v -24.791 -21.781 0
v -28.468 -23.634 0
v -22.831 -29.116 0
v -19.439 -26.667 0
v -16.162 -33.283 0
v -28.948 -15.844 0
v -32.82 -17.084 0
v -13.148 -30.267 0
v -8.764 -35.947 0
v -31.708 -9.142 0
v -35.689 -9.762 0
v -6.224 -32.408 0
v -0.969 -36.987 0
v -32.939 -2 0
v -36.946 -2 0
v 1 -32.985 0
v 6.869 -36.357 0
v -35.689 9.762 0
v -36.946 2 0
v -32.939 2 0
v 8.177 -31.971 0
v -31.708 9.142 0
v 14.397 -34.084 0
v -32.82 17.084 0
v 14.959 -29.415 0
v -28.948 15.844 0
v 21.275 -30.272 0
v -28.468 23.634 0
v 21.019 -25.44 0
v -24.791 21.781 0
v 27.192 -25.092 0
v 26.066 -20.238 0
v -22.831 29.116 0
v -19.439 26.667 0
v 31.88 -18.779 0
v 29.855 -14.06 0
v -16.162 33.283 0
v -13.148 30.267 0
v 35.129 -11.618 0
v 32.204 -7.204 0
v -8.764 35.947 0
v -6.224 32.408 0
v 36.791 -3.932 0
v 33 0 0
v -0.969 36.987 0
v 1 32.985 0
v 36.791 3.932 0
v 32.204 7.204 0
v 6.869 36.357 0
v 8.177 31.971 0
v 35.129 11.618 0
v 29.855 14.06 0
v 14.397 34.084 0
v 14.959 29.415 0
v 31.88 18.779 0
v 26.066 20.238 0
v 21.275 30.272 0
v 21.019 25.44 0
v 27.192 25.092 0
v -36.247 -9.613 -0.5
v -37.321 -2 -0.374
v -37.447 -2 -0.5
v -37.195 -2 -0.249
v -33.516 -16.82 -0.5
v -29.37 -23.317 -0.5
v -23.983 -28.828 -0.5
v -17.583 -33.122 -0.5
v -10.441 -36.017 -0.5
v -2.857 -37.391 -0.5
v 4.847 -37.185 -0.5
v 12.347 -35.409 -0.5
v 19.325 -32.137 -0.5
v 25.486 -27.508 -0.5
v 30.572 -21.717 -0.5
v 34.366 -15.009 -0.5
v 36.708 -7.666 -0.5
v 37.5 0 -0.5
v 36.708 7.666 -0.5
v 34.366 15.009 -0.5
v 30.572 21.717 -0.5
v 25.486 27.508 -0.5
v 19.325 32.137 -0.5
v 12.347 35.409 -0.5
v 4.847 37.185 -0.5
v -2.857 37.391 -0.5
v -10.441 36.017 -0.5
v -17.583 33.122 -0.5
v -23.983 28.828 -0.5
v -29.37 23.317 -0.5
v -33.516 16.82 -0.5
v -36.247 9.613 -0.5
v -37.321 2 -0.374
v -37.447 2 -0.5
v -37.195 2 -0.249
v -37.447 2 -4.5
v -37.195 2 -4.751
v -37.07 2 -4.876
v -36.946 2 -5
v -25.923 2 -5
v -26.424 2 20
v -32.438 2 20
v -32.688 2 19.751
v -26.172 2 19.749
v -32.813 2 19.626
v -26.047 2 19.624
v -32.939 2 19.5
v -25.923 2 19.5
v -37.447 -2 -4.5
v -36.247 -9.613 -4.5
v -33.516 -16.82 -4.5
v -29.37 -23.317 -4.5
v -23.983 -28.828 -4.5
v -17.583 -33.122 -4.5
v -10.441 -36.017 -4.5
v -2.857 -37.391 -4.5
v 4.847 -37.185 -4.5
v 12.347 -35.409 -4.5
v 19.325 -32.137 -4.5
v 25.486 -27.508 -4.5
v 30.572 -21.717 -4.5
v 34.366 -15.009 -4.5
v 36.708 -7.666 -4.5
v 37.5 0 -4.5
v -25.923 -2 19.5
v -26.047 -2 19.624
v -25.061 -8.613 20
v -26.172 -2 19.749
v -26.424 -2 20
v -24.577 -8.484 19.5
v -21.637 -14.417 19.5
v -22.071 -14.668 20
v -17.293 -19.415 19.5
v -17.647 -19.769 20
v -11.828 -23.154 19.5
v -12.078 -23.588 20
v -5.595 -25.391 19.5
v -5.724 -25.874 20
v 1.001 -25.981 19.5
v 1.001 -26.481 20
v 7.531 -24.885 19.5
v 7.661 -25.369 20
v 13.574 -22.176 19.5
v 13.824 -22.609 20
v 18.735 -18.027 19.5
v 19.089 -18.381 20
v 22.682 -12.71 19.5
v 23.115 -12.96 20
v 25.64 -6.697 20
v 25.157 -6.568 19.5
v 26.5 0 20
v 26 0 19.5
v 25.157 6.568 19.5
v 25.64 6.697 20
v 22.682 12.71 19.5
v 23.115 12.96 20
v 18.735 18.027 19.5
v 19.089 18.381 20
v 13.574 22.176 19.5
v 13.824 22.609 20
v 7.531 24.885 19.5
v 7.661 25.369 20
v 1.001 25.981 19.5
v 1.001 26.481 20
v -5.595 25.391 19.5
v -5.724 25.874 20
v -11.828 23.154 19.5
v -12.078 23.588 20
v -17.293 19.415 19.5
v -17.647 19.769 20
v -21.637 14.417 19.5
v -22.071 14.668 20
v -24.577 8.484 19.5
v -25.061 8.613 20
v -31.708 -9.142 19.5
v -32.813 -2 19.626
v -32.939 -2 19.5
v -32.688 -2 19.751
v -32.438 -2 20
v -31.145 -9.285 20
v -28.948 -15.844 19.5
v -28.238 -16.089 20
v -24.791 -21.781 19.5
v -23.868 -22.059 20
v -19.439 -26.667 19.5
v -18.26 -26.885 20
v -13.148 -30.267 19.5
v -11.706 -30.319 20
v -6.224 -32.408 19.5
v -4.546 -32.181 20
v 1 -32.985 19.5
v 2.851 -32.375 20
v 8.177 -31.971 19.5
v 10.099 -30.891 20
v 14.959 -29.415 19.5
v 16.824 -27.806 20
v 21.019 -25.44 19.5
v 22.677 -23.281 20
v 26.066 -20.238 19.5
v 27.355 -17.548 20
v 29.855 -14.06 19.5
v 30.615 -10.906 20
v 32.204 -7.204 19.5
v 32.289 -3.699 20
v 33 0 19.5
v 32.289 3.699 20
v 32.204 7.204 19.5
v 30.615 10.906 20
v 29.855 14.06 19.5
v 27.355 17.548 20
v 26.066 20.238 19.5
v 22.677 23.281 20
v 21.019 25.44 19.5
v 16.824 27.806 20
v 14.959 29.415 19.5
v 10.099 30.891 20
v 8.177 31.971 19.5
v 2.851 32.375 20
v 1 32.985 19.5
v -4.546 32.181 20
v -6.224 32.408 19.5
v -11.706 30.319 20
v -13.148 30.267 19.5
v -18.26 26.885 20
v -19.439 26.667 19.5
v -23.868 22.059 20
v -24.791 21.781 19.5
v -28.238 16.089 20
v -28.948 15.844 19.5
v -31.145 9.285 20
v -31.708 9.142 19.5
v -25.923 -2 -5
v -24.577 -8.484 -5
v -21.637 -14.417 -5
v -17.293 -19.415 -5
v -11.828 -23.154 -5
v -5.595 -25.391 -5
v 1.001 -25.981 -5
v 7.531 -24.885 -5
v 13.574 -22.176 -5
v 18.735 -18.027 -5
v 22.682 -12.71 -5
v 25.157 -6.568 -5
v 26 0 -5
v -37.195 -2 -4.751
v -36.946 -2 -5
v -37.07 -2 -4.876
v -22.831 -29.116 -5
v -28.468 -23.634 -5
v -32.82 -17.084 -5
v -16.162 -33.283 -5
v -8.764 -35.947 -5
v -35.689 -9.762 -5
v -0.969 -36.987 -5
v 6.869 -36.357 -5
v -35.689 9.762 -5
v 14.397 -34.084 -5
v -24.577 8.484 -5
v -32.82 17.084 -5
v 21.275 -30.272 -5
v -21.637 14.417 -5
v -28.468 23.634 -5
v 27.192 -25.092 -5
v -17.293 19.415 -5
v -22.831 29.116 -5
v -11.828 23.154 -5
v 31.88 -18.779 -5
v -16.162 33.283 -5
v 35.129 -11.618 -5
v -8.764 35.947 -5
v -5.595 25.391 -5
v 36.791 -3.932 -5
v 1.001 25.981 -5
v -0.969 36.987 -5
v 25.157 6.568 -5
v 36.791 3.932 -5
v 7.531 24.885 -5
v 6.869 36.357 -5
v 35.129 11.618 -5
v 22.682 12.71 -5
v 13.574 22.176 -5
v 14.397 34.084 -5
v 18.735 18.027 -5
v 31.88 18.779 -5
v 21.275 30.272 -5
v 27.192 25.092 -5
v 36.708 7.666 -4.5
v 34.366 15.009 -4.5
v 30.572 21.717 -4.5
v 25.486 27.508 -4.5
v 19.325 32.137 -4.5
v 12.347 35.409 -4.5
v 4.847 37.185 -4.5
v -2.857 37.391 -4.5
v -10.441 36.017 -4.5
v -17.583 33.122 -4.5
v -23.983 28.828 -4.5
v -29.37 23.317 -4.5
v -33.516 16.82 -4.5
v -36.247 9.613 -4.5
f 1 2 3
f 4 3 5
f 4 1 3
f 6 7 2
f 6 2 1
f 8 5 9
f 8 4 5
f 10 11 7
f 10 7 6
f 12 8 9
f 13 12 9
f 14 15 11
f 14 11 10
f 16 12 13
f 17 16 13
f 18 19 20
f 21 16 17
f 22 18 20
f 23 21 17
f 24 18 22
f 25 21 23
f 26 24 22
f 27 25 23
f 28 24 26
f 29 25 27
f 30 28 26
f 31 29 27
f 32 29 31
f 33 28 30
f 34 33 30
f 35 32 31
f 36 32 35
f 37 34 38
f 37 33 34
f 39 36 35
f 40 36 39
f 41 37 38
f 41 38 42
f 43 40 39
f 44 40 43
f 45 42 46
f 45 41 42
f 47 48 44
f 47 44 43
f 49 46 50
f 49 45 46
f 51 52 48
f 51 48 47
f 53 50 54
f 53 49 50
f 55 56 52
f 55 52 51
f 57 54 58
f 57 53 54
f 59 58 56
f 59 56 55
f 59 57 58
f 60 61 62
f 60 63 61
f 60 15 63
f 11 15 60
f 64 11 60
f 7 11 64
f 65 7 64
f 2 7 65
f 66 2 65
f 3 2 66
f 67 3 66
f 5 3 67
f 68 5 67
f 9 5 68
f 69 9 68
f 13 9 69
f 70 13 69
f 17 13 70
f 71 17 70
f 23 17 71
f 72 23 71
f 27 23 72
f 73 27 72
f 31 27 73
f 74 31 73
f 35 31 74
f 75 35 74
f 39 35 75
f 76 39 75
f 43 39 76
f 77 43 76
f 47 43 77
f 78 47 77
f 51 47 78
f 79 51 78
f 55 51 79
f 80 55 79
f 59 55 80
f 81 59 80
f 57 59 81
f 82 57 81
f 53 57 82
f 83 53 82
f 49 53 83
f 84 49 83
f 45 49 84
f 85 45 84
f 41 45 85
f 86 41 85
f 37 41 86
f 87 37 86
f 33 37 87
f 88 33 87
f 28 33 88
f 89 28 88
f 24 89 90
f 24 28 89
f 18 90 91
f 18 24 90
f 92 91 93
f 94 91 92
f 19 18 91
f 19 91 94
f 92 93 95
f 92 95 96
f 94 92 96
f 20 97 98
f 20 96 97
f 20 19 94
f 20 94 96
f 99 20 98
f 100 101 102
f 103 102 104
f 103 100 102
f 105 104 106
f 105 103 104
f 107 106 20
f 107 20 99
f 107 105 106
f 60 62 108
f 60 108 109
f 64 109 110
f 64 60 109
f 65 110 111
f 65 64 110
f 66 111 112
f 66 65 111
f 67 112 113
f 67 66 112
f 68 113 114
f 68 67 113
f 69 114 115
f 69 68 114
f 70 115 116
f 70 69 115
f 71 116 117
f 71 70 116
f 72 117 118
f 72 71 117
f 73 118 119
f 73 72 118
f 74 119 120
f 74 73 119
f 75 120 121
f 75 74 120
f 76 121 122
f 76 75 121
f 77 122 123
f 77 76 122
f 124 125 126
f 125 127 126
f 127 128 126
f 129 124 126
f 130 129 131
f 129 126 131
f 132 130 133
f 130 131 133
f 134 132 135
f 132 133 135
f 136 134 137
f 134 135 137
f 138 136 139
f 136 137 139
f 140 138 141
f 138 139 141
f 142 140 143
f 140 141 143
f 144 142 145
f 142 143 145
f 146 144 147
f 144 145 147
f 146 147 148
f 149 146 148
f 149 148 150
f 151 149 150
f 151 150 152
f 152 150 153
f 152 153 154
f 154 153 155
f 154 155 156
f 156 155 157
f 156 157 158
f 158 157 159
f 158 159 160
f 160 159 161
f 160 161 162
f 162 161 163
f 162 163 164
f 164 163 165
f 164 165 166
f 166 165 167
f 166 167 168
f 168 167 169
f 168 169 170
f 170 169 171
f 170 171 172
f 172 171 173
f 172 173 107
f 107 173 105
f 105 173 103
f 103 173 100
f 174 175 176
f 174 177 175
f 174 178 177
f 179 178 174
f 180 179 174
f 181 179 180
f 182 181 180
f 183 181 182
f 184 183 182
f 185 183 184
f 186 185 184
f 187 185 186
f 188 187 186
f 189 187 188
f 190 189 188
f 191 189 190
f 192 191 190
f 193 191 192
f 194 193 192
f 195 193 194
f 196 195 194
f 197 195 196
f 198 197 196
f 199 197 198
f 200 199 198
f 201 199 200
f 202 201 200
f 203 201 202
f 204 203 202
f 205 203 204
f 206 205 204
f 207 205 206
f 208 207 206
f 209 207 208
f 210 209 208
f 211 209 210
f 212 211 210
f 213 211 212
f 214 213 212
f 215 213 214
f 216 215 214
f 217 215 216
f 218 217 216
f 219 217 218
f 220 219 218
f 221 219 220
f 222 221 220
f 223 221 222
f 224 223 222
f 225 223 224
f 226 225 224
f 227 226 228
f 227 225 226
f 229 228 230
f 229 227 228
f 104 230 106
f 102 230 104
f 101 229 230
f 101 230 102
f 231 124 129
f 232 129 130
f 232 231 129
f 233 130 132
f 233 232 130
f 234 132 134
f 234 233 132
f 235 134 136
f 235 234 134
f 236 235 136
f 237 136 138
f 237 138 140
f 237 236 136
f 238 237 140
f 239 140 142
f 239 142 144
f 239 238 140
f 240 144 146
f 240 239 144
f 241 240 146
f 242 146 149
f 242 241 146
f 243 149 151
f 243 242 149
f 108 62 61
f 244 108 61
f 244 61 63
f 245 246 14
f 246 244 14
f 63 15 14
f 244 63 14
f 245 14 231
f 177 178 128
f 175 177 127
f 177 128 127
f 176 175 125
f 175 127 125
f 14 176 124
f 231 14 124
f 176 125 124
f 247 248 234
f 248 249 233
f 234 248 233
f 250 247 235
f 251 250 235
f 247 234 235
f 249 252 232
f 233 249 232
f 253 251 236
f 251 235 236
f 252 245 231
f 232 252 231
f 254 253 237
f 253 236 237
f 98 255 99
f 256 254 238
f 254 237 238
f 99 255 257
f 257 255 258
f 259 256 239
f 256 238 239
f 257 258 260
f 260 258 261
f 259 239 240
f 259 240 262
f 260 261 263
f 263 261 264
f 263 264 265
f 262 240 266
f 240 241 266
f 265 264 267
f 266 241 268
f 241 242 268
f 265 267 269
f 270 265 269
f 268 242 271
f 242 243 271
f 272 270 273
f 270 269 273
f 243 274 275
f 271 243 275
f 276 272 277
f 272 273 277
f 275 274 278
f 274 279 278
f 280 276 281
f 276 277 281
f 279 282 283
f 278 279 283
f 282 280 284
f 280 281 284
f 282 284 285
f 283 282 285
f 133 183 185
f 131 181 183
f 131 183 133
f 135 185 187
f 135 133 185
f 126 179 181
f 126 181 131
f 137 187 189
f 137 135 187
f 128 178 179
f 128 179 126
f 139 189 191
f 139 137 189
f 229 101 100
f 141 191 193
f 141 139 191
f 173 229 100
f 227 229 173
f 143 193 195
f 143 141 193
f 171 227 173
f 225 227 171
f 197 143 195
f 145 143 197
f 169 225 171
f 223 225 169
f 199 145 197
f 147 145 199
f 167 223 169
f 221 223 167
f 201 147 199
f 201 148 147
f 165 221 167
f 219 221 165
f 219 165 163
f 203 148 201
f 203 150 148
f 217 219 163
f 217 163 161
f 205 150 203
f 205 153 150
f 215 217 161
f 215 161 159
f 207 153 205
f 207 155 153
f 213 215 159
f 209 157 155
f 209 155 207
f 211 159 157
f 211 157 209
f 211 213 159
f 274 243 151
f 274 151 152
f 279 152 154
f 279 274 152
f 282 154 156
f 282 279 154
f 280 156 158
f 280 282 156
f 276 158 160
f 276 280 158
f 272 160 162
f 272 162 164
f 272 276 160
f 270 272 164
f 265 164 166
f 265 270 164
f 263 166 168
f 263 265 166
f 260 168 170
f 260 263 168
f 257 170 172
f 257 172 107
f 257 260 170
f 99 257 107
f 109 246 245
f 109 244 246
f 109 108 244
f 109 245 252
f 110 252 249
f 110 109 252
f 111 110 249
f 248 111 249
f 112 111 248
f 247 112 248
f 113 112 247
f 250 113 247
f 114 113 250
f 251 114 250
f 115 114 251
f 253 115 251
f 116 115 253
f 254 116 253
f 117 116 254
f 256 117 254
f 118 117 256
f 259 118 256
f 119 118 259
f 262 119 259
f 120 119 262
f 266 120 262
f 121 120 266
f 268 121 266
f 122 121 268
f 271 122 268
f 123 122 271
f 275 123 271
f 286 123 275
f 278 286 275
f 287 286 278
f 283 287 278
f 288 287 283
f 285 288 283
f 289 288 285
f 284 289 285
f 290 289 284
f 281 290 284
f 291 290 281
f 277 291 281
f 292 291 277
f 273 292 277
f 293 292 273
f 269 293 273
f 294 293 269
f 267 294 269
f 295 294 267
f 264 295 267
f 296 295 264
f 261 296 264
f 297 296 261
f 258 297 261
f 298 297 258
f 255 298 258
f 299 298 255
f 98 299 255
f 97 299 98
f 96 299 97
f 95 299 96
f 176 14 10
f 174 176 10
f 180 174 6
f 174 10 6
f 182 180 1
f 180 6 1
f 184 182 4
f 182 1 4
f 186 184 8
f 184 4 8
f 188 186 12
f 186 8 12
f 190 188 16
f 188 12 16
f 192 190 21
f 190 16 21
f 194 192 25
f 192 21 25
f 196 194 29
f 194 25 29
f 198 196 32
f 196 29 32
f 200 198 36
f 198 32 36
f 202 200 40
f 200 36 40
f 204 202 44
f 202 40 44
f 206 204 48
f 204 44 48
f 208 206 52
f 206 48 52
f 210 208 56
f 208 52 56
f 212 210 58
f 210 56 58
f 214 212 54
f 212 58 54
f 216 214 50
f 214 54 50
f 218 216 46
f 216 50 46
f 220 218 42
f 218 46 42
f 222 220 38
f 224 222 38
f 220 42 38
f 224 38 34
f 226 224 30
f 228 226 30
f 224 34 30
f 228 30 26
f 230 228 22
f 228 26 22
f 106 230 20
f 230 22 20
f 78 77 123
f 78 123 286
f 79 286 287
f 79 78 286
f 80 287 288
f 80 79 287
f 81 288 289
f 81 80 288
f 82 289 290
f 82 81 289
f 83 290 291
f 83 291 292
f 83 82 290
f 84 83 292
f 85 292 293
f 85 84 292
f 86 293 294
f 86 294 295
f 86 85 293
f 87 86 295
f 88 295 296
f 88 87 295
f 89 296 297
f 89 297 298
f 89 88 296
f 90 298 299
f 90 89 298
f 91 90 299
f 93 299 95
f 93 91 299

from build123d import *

# Parameters (mm, degrees)
F0_R     = 33
F0_R_2   = 26
F1_DEPTH = 20
F2_R     = 37.5
F2_R_2   = 26
F3_DEPTH = 5
F4_W     = 22
F4_H     = 4
F5_DEPTH = 25
F6_SIZE  = 0.5


with BuildPart() as f1:
    # F0 (on Top) → F1 (new body)
    with BuildSketch(Plane.XY):
        Circle(F0_R)
        Circle(F0_R_2, mode=Mode.SUBTRACT)
    extrude(amount=F1_DEPTH)

    # F2 (on Top) → F3 (join)
    with BuildSketch(Plane.XY):
        Circle(F2_R)
        Circle(F2_R_2, mode=Mode.SUBTRACT)
    extrude(amount=-F3_DEPTH)

    # F4 (on Top) → F5 (cut, symmetric)
    with BuildSketch(Plane.XY):
        with Locations((-31.949636, 0)):
            Rectangle(F4_W, F4_H)
    extrude(amount=F5_DEPTH, both=True, mode=Mode.SUBTRACT)

    # F6
    f6_edges = [f1.edges().sort_by_distance(p)[0] for p in [
        (1.00046, 32.984831, 20),
        (1.00046, -32.984831, 20),
        (1.000742, -25.980734, 20),
        (1.000742, 25.980734, 20),
        (1.000356, -37.486655, 0),
        (1.000356, 37.486655, 0),
        (1.000356, -37.486655, -5),
        (1.000356, 37.486655, -5),
    ]]
    chamfer(f6_edges, length=F6_SIZE)


solid = f1.part
